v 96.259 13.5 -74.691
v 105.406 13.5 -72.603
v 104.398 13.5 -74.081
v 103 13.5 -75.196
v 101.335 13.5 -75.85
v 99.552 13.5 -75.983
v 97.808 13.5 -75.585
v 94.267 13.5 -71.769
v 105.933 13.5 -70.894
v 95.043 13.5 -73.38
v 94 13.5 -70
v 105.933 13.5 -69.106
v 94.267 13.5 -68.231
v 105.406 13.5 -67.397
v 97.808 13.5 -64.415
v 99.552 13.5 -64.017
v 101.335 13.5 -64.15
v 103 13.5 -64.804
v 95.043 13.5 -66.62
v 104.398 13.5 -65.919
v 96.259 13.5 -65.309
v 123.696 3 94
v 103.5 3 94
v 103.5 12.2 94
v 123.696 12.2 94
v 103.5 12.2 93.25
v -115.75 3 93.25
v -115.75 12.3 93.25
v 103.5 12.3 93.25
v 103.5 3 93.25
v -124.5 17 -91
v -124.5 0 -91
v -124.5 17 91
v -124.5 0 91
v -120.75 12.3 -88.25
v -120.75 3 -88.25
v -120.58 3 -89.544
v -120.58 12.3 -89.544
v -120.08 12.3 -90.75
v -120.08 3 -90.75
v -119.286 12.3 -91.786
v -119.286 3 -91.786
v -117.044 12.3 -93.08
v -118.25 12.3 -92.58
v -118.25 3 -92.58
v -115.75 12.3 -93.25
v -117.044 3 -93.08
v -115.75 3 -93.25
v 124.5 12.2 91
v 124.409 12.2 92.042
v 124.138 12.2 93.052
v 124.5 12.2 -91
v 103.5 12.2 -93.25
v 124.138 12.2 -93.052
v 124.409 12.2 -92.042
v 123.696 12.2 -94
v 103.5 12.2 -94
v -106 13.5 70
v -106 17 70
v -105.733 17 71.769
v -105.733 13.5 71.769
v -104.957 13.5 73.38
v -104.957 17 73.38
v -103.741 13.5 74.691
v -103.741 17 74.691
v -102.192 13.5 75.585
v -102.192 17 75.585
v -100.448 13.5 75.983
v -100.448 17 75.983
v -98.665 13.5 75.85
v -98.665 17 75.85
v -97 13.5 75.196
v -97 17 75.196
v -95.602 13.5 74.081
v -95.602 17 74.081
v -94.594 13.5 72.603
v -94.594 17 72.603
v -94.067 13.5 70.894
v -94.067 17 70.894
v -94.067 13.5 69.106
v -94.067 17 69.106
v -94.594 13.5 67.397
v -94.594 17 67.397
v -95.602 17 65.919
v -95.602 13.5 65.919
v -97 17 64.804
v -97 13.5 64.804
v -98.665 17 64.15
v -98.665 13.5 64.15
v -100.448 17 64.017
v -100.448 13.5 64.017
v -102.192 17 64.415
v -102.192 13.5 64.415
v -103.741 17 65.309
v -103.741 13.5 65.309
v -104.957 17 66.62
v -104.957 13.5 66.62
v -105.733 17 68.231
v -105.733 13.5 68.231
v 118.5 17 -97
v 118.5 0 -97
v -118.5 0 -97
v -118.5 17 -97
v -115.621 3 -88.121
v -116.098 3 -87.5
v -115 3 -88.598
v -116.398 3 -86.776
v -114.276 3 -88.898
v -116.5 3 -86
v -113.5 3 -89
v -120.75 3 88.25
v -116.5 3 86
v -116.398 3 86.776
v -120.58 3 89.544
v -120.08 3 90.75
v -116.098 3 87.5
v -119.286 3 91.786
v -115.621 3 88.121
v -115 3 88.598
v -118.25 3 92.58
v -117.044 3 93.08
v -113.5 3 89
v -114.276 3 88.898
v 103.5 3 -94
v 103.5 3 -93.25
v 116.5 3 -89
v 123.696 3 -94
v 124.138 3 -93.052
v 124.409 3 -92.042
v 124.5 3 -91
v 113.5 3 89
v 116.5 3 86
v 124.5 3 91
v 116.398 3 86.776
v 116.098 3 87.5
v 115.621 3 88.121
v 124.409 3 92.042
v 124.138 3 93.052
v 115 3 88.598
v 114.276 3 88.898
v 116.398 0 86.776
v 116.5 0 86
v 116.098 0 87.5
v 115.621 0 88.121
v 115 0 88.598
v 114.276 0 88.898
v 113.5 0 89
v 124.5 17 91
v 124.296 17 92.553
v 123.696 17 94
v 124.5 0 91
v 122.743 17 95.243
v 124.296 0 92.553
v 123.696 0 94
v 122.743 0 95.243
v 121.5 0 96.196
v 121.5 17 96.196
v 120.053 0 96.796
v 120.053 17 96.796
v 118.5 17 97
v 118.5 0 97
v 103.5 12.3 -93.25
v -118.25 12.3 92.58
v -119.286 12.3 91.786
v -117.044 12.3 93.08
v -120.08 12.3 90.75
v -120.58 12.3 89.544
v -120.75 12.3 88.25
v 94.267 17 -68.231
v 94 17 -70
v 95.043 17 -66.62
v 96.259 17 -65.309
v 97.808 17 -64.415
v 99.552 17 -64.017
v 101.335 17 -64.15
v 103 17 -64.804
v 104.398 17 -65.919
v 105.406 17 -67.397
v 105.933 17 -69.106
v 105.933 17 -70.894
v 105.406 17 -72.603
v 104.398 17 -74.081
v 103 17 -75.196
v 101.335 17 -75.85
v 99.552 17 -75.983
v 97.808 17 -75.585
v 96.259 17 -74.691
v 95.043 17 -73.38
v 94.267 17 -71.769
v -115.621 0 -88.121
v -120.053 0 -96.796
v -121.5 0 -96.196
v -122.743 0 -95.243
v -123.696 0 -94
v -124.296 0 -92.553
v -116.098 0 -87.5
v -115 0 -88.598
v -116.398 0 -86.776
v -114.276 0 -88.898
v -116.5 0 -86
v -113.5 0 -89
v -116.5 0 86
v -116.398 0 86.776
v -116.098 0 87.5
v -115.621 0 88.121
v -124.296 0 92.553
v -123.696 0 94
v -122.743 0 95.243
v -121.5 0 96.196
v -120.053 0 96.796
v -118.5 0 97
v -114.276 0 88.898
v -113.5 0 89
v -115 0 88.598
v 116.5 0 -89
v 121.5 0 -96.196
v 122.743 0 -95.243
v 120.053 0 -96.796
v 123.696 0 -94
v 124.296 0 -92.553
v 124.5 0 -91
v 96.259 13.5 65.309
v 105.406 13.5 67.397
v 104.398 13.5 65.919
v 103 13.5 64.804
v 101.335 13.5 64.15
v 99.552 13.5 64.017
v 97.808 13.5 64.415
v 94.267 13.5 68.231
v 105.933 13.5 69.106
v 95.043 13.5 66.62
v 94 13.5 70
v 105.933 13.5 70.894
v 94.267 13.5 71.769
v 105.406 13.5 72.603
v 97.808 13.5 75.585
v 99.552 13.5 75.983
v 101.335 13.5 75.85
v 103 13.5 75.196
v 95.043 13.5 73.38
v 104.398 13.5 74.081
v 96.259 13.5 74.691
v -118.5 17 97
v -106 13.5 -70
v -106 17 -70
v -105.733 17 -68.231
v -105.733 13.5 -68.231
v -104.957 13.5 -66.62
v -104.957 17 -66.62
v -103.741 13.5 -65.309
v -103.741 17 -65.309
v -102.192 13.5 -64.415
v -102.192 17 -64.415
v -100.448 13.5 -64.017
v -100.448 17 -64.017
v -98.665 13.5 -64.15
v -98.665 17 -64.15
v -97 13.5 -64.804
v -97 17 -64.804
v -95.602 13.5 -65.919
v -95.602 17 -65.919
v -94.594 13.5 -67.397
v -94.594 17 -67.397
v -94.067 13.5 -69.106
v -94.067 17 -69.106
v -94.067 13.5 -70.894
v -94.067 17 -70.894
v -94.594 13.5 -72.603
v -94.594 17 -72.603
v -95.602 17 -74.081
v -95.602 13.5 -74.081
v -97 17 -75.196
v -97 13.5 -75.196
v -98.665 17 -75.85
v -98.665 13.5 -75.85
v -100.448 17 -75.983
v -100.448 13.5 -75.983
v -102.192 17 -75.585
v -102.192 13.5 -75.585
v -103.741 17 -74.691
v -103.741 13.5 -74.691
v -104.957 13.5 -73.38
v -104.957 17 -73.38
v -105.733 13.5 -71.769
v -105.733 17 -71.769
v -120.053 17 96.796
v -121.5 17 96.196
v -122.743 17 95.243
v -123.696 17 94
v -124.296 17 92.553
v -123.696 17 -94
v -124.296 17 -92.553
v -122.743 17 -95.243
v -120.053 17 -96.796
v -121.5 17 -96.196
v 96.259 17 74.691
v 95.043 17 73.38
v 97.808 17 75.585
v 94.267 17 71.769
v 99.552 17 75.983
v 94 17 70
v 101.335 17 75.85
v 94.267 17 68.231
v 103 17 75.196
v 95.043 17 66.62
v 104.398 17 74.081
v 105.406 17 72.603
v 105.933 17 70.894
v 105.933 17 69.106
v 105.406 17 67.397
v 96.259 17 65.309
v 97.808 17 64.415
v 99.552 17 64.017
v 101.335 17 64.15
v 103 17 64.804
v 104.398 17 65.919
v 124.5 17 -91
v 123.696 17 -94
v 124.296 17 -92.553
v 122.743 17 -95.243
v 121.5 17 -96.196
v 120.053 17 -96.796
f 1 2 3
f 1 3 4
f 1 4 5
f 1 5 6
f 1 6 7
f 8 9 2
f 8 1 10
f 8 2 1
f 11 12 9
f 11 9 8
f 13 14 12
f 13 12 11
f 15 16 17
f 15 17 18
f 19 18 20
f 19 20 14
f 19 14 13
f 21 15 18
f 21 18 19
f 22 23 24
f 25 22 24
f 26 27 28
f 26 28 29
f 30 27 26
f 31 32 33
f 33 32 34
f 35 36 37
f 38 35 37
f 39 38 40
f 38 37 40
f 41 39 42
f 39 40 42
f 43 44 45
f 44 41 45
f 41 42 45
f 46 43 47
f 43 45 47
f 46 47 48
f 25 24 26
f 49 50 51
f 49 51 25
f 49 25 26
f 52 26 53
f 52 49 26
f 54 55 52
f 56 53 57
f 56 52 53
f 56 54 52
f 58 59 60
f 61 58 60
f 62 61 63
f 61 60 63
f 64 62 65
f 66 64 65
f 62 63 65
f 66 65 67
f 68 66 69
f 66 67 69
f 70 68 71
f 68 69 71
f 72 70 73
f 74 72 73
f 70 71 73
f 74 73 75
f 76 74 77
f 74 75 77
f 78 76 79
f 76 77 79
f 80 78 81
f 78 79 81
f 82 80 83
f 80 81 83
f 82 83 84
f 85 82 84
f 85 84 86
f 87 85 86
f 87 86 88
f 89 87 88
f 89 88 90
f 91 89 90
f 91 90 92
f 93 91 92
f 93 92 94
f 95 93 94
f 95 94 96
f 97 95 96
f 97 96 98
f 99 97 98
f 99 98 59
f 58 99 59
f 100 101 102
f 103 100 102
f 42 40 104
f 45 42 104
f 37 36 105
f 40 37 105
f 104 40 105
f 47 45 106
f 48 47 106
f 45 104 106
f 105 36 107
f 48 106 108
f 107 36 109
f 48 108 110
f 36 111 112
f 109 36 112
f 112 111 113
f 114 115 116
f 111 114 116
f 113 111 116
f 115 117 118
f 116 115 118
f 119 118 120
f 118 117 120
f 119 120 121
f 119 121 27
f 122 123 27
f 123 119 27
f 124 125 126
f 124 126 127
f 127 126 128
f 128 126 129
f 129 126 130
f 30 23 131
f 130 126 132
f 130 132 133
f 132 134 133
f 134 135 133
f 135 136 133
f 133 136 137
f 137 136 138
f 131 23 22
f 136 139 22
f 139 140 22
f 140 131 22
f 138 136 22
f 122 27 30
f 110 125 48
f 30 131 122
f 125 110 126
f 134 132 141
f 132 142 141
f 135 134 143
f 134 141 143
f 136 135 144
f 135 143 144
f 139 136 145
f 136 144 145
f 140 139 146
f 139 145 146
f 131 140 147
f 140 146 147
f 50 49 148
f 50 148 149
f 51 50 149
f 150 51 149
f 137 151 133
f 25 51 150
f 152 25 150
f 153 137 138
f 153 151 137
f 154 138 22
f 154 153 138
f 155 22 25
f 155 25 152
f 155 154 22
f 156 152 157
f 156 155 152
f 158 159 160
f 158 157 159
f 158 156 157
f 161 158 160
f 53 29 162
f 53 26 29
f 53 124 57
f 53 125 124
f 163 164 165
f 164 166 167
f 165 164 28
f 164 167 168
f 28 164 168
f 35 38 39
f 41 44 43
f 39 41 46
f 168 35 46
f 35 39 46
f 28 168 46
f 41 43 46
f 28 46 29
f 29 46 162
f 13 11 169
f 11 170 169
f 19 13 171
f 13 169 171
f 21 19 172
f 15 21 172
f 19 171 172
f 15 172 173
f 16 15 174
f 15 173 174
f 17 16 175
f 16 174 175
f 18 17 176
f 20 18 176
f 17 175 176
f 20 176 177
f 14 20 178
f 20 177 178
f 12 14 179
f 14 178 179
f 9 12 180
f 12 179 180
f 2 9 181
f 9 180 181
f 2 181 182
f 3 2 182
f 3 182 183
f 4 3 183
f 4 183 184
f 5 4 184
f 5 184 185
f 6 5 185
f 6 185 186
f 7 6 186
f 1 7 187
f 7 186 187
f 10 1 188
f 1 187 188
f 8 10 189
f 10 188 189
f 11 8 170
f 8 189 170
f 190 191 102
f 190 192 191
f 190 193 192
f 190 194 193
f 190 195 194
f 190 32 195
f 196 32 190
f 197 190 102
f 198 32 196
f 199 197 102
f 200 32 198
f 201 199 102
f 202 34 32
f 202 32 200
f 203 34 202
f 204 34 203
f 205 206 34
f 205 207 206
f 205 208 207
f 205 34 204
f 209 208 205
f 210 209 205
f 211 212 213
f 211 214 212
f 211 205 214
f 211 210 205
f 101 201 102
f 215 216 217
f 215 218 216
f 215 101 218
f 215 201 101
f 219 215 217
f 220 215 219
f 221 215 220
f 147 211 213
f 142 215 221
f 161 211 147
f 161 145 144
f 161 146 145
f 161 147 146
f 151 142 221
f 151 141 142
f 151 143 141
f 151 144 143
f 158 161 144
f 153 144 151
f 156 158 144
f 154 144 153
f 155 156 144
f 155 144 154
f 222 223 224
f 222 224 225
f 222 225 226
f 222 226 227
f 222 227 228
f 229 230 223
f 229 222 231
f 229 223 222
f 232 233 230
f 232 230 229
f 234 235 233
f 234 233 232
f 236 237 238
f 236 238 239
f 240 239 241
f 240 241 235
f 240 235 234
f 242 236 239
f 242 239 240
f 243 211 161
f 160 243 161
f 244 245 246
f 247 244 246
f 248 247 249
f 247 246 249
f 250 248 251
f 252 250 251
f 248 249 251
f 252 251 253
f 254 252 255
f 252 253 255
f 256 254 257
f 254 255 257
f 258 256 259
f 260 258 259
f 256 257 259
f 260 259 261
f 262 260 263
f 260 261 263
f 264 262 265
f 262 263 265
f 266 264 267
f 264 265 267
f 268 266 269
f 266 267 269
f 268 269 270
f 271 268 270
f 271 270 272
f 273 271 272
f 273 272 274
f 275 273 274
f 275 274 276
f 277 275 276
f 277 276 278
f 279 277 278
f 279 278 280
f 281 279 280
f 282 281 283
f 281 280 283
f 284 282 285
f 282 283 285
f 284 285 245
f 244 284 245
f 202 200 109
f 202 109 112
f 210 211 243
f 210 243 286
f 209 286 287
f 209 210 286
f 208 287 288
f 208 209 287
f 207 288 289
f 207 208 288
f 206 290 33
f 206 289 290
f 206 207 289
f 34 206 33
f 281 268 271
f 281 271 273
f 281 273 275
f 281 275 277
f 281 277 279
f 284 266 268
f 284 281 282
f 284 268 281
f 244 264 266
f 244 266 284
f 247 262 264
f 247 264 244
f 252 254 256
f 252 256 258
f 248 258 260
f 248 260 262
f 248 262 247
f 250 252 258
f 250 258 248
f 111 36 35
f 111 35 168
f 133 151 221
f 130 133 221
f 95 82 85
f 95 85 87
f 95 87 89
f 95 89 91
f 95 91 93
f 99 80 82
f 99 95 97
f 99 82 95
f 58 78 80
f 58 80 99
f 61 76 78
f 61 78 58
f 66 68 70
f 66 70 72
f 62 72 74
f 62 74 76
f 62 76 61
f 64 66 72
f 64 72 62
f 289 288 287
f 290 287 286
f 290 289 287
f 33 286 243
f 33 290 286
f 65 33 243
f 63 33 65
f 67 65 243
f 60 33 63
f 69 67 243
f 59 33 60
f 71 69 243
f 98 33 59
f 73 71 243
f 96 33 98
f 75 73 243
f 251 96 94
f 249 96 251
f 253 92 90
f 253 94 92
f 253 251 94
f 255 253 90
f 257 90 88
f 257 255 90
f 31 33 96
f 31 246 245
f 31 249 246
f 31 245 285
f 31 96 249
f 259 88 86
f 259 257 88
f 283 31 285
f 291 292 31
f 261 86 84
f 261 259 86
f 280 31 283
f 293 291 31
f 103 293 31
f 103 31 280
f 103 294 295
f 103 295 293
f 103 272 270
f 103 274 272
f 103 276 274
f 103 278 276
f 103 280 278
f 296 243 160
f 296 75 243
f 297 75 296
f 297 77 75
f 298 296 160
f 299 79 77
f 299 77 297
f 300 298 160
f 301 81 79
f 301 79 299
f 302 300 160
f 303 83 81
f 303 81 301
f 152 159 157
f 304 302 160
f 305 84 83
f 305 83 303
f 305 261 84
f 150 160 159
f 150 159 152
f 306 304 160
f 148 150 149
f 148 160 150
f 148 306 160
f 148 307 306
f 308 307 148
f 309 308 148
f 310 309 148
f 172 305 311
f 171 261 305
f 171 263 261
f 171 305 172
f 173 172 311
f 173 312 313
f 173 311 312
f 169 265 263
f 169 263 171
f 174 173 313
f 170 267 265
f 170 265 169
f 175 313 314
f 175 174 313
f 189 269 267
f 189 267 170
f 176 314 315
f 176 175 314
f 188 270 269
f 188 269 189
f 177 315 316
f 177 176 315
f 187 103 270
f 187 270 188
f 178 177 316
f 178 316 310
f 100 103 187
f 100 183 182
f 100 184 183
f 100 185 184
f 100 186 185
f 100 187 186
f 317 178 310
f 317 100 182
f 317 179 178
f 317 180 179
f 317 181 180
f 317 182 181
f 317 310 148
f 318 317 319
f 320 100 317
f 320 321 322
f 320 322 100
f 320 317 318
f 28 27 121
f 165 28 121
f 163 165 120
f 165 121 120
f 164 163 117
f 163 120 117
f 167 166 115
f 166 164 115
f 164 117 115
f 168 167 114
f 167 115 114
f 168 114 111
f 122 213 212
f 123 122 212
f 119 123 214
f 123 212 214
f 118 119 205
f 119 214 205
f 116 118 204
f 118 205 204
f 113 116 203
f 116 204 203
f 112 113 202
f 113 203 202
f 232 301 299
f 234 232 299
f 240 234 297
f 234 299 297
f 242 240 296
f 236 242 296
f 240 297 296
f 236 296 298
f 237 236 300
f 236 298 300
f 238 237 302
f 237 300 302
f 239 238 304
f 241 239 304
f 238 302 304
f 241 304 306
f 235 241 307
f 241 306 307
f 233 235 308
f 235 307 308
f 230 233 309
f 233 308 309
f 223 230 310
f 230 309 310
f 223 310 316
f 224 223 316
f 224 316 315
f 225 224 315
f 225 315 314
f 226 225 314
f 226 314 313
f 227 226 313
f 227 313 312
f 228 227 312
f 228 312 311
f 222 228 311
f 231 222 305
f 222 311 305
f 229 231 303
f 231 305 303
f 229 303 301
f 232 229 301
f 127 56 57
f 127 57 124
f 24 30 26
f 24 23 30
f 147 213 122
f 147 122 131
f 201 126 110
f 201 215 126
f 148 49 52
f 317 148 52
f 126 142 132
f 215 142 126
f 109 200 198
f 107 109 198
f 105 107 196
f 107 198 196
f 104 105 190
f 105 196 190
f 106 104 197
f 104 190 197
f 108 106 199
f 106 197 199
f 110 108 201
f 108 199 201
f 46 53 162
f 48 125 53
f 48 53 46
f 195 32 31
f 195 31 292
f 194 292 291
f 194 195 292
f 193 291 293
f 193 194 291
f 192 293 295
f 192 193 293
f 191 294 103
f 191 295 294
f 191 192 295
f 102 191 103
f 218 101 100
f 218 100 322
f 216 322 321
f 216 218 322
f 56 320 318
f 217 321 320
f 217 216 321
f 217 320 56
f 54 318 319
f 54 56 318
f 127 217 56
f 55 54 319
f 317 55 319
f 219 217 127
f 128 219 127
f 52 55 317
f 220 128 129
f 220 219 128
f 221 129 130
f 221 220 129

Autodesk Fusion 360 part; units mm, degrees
sketch "Sketch1" plane through (0, 0, 0) normal (0, 1, 0) x (1, 0, 0)
  line L0 (118.5, 97) -> (-118.5, 97)
  line L1 (-124.5, 91) -> (-124.5, -91)
  line L2 (-118.5, -97) -> (118.5, -97)
  line L3 (124.5, -91) -> (124.5, 91)
  line L4 (124.5, 97) -> (-124.5, -97) construction
  line L5 (-124.5, 97) -> (124.5, -97) construction
  arc A0 (118.5, -97) -> (124.5, -91) centre (118.5, -91) ccw
  arc A1 (-124.5, -91) -> (-118.5, -97) centre (-118.5, -91) ccw
  arc A2 (124.5, 91) -> (118.5, 97) centre (118.5, 91) ccw
  arc A3 (-118.5, 97) -> (-124.5, 91) centre (-118.5, 91) ccw
  dimension "d1" = 249
  dimension "d2" = 194
  dimension "d3" = 6
  dimension "d4" = 6
  dimension "d5" = 6
  dimension "d6" = 6
extrude "Extrude1" add sketch "Sketch1" along normal blind 17
sketch "Sketch2" plane through (0, 0, 0) normal (0, 1, 0) x (1, 0, 0)
  line L0 (115.75, 93.25) -> (-115.75, 93.25)
  line L1 (-120.75, 88.25) -> (-120.75, -88.25)
  line L2 (-115.75, -93.25) -> (115.75, -93.25)
  line L3 (120.75, -88.25) -> (120.75, 88.25)
  line L4 (120.75, 93.25) -> (-120.75, -93.25) construction
  line L5 (-120.75, 93.25) -> (120.75, -93.25) construction
  arc A0 (-120.75, -88.25) -> (-115.75, -93.25) centre (-115.75, -88.25) ccw
  arc A1 (115.75, -93.25) -> (120.75, -88.25) centre (115.75, -88.25) ccw
  arc A2 (-115.75, 93.25) -> (-120.75, 88.25) centre (-115.75, 88.25) ccw
  arc A3 (120.75, 88.25) -> (115.75, 93.25) centre (115.75, 88.25) ccw
  dimension "d9" = 241.5
  dimension "d10" = 186.5
  dimension "d11" = 5
  dimension "d12" = 5
  dimension "d13" = 5
  dimension "d14" = 5
ref_plane "WorkPlane1" through (0, 3, 0) normal (0, 1, 0) x (-1, 0, 0)
extrude "Extrude2" cut sketch "Sketch2" along normal blind 9.3
sketch "Sketch3" plane through (0, 0, 0) normal (0, -1, 0) x (1, 0, 0)
  line L0 (120.75, 88.25) -> (120.75, -88.25)
  arc A0 (115.75, -93.25) -> (120.75, -88.25) centre (115.75, -88.25) ccw
  line L1 (115.75, -93.25) -> (-115.75, -93.25)
  arc A1 (-120.75, -88.25) -> (-115.75, -93.25) centre (-115.75, -88.25) ccw
  line L2 (-120.75, -88.25) -> (-120.75, 88.25)
  arc A2 (-115.75, 93.25) -> (-120.75, 88.25) centre (-115.75, 88.25) ccw
  line L3 (-115.75, 93.25) -> (115.75, 93.25)
  arc A3 (120.75, 88.25) -> (115.75, 93.25) centre (115.75, 88.25) ccw
  arc A4 (-124.5, -91) -> (-118.5, -97) centre (-118.5, -91) ccw
  line L4 (-118.5, -97) -> (118.5, -97)
  arc A5 (118.5, -97) -> (124.5, -91) centre (118.5, -91) ccw
  line L5 (124.5, -91) -> (124.5, 91)
  arc A6 (124.5, 91) -> (118.5, 97) centre (118.5, 91) ccw
  line L6 (118.5, 97) -> (-118.5, 97)
  arc A7 (-118.5, 97) -> (-124.5, 91) centre (-118.5, 91) ccw
  line L7 (-124.5, 91) -> (-124.5, -91)
  line L8 (-113.5, 89) -> (113.5, 89)
  line L9 (116.5, 86) -> (116.5, -89)
  line L10 (116.5, -89) -> (-113.5, -89)
  line L11 (-116.5, -86) -> (-116.5, 86)
  line L12 (-116.5, 89) -> (116.5, -89) construction
  line L13 (116.5, 89) -> (-116.5, -89) construction
  arc A8 (-113.5, 89) -> (-116.5, 86) centre (-113.5, 86) ccw
  arc A9 (116.5, 86) -> (113.5, 89) centre (113.5, 86) ccw
  arc A10 (-116.5, -86) -> (-113.5, -89) centre (-113.5, -86) ccw
  dimension "d18" = 233
  dimension "d19" = 178
  dimension "d20" = 3
  dimension "d21" = 3
  dimension "d22" = 3
sketch "Sketch4" plane through (124.5, 0, 0) normal (1, 0, 0) x (0, 1, 0)
  line L0 (0, 91) -> (0, -91)
  line L1 (0, -91) -> (17, -91)
  line L2 (17, -91) -> (17, 91)
  line L3 (17, 91) -> (0, 91)
  line L4 (3, 94) -> (12.2, 94)
  line L5 (12.2, 94) -> (12.2, -94)
  line L6 (12.2, -94) -> (3, -94)
  line L7 (3, -94) -> (3, 94)
  dimension "d23" = 9.2
  dimension "d24" = 188
extrude "Extrude3" cut sketch "Sketch4" against normal blind 6 contours L3 L4 L5 L7 | L1 L3 L5 L7 | L1 L5 L6 L7
sketch "Sketch5" plane through (0, 17, 0) normal (0, 1, 0) x (-1, 0, 0)
  arc A0 (118.5, -97) -> (124.5, -91) centre (118.5, -91) ccw
  line L0 (124.5, -91) -> (124.5, 91)
  arc A1 (124.5, 91) -> (118.5, 97) centre (118.5, 91) ccw
  line L1 (118.5, 97) -> (-118.5, 97)
  arc A2 (-118.5, 97) -> (-124.5, 91) centre (-118.5, 91) ccw
  line L2 (-124.5, 91) -> (-124.5, -91)
  arc A3 (-124.5, -91) -> (-118.5, -97) centre (-118.5, -91) ccw
  line L3 (-118.5, -97) -> (118.5, -97)
  circle A4 centre (-100, 70) radius 6
  circle A5 centre (100, 70) radius 6
  circle A6 centre (-100, -70) radius 6
  circle A7 centre (100, -70) radius 6
  dimension "d27" = 12
  dimension "d28" = 12
  dimension "d29" = 12
  dimension "d30" = 12
extrude "Extrude4" cut sketch "Sketch5" against normal blind 3.5 contours A4 | A5 | A6 | A7
extrude "Extrude5" add sketch "Sketch3" against normal blind 3 contours L0 A0 L1 A1 L2 A2 L3 A3
sketch "Sketch6" plane through (118.5, 0, 0) normal (1, 0, 0) x (0, 1, 0)
  line L0 (9.3, -92.4258) -> (3, -92.4258)
  line L1 (3, -92.4258) -> (3, -94)
  line L2 (3, -94) -> (12.2, -94)
  line L3 (12.2, -94) -> (12.2, 94)
  line L4 (12.2, 94) -> (3, 94)
  line L5 (3, 94) -> (3, 92.4258)
  line L6 (3, 92.4258) -> (9.3, 92.4258)
  line L7 (9.3, 92.4258) -> (9.3, -92.4258)
  line L8 (3, 94) -> (12.2, 94)
  line L9 (12.2, 94) -> (12.2, -94)
  line L10 (12.2, -94) -> (3, -94)
  line L11 (3, -94) -> (3, 94)
extrude "Extrude6" cut sketch "Sketch6" against normal blind 15
sketch "Sketch7" plane through (0, 3, 0) normal (0, 1, 0) x (1, 0, 0)
extrude "Extrude7" cut 1 faces at (-42.6667, 9.3, -31.0833) along direction (0, 1, 0) blind 3
